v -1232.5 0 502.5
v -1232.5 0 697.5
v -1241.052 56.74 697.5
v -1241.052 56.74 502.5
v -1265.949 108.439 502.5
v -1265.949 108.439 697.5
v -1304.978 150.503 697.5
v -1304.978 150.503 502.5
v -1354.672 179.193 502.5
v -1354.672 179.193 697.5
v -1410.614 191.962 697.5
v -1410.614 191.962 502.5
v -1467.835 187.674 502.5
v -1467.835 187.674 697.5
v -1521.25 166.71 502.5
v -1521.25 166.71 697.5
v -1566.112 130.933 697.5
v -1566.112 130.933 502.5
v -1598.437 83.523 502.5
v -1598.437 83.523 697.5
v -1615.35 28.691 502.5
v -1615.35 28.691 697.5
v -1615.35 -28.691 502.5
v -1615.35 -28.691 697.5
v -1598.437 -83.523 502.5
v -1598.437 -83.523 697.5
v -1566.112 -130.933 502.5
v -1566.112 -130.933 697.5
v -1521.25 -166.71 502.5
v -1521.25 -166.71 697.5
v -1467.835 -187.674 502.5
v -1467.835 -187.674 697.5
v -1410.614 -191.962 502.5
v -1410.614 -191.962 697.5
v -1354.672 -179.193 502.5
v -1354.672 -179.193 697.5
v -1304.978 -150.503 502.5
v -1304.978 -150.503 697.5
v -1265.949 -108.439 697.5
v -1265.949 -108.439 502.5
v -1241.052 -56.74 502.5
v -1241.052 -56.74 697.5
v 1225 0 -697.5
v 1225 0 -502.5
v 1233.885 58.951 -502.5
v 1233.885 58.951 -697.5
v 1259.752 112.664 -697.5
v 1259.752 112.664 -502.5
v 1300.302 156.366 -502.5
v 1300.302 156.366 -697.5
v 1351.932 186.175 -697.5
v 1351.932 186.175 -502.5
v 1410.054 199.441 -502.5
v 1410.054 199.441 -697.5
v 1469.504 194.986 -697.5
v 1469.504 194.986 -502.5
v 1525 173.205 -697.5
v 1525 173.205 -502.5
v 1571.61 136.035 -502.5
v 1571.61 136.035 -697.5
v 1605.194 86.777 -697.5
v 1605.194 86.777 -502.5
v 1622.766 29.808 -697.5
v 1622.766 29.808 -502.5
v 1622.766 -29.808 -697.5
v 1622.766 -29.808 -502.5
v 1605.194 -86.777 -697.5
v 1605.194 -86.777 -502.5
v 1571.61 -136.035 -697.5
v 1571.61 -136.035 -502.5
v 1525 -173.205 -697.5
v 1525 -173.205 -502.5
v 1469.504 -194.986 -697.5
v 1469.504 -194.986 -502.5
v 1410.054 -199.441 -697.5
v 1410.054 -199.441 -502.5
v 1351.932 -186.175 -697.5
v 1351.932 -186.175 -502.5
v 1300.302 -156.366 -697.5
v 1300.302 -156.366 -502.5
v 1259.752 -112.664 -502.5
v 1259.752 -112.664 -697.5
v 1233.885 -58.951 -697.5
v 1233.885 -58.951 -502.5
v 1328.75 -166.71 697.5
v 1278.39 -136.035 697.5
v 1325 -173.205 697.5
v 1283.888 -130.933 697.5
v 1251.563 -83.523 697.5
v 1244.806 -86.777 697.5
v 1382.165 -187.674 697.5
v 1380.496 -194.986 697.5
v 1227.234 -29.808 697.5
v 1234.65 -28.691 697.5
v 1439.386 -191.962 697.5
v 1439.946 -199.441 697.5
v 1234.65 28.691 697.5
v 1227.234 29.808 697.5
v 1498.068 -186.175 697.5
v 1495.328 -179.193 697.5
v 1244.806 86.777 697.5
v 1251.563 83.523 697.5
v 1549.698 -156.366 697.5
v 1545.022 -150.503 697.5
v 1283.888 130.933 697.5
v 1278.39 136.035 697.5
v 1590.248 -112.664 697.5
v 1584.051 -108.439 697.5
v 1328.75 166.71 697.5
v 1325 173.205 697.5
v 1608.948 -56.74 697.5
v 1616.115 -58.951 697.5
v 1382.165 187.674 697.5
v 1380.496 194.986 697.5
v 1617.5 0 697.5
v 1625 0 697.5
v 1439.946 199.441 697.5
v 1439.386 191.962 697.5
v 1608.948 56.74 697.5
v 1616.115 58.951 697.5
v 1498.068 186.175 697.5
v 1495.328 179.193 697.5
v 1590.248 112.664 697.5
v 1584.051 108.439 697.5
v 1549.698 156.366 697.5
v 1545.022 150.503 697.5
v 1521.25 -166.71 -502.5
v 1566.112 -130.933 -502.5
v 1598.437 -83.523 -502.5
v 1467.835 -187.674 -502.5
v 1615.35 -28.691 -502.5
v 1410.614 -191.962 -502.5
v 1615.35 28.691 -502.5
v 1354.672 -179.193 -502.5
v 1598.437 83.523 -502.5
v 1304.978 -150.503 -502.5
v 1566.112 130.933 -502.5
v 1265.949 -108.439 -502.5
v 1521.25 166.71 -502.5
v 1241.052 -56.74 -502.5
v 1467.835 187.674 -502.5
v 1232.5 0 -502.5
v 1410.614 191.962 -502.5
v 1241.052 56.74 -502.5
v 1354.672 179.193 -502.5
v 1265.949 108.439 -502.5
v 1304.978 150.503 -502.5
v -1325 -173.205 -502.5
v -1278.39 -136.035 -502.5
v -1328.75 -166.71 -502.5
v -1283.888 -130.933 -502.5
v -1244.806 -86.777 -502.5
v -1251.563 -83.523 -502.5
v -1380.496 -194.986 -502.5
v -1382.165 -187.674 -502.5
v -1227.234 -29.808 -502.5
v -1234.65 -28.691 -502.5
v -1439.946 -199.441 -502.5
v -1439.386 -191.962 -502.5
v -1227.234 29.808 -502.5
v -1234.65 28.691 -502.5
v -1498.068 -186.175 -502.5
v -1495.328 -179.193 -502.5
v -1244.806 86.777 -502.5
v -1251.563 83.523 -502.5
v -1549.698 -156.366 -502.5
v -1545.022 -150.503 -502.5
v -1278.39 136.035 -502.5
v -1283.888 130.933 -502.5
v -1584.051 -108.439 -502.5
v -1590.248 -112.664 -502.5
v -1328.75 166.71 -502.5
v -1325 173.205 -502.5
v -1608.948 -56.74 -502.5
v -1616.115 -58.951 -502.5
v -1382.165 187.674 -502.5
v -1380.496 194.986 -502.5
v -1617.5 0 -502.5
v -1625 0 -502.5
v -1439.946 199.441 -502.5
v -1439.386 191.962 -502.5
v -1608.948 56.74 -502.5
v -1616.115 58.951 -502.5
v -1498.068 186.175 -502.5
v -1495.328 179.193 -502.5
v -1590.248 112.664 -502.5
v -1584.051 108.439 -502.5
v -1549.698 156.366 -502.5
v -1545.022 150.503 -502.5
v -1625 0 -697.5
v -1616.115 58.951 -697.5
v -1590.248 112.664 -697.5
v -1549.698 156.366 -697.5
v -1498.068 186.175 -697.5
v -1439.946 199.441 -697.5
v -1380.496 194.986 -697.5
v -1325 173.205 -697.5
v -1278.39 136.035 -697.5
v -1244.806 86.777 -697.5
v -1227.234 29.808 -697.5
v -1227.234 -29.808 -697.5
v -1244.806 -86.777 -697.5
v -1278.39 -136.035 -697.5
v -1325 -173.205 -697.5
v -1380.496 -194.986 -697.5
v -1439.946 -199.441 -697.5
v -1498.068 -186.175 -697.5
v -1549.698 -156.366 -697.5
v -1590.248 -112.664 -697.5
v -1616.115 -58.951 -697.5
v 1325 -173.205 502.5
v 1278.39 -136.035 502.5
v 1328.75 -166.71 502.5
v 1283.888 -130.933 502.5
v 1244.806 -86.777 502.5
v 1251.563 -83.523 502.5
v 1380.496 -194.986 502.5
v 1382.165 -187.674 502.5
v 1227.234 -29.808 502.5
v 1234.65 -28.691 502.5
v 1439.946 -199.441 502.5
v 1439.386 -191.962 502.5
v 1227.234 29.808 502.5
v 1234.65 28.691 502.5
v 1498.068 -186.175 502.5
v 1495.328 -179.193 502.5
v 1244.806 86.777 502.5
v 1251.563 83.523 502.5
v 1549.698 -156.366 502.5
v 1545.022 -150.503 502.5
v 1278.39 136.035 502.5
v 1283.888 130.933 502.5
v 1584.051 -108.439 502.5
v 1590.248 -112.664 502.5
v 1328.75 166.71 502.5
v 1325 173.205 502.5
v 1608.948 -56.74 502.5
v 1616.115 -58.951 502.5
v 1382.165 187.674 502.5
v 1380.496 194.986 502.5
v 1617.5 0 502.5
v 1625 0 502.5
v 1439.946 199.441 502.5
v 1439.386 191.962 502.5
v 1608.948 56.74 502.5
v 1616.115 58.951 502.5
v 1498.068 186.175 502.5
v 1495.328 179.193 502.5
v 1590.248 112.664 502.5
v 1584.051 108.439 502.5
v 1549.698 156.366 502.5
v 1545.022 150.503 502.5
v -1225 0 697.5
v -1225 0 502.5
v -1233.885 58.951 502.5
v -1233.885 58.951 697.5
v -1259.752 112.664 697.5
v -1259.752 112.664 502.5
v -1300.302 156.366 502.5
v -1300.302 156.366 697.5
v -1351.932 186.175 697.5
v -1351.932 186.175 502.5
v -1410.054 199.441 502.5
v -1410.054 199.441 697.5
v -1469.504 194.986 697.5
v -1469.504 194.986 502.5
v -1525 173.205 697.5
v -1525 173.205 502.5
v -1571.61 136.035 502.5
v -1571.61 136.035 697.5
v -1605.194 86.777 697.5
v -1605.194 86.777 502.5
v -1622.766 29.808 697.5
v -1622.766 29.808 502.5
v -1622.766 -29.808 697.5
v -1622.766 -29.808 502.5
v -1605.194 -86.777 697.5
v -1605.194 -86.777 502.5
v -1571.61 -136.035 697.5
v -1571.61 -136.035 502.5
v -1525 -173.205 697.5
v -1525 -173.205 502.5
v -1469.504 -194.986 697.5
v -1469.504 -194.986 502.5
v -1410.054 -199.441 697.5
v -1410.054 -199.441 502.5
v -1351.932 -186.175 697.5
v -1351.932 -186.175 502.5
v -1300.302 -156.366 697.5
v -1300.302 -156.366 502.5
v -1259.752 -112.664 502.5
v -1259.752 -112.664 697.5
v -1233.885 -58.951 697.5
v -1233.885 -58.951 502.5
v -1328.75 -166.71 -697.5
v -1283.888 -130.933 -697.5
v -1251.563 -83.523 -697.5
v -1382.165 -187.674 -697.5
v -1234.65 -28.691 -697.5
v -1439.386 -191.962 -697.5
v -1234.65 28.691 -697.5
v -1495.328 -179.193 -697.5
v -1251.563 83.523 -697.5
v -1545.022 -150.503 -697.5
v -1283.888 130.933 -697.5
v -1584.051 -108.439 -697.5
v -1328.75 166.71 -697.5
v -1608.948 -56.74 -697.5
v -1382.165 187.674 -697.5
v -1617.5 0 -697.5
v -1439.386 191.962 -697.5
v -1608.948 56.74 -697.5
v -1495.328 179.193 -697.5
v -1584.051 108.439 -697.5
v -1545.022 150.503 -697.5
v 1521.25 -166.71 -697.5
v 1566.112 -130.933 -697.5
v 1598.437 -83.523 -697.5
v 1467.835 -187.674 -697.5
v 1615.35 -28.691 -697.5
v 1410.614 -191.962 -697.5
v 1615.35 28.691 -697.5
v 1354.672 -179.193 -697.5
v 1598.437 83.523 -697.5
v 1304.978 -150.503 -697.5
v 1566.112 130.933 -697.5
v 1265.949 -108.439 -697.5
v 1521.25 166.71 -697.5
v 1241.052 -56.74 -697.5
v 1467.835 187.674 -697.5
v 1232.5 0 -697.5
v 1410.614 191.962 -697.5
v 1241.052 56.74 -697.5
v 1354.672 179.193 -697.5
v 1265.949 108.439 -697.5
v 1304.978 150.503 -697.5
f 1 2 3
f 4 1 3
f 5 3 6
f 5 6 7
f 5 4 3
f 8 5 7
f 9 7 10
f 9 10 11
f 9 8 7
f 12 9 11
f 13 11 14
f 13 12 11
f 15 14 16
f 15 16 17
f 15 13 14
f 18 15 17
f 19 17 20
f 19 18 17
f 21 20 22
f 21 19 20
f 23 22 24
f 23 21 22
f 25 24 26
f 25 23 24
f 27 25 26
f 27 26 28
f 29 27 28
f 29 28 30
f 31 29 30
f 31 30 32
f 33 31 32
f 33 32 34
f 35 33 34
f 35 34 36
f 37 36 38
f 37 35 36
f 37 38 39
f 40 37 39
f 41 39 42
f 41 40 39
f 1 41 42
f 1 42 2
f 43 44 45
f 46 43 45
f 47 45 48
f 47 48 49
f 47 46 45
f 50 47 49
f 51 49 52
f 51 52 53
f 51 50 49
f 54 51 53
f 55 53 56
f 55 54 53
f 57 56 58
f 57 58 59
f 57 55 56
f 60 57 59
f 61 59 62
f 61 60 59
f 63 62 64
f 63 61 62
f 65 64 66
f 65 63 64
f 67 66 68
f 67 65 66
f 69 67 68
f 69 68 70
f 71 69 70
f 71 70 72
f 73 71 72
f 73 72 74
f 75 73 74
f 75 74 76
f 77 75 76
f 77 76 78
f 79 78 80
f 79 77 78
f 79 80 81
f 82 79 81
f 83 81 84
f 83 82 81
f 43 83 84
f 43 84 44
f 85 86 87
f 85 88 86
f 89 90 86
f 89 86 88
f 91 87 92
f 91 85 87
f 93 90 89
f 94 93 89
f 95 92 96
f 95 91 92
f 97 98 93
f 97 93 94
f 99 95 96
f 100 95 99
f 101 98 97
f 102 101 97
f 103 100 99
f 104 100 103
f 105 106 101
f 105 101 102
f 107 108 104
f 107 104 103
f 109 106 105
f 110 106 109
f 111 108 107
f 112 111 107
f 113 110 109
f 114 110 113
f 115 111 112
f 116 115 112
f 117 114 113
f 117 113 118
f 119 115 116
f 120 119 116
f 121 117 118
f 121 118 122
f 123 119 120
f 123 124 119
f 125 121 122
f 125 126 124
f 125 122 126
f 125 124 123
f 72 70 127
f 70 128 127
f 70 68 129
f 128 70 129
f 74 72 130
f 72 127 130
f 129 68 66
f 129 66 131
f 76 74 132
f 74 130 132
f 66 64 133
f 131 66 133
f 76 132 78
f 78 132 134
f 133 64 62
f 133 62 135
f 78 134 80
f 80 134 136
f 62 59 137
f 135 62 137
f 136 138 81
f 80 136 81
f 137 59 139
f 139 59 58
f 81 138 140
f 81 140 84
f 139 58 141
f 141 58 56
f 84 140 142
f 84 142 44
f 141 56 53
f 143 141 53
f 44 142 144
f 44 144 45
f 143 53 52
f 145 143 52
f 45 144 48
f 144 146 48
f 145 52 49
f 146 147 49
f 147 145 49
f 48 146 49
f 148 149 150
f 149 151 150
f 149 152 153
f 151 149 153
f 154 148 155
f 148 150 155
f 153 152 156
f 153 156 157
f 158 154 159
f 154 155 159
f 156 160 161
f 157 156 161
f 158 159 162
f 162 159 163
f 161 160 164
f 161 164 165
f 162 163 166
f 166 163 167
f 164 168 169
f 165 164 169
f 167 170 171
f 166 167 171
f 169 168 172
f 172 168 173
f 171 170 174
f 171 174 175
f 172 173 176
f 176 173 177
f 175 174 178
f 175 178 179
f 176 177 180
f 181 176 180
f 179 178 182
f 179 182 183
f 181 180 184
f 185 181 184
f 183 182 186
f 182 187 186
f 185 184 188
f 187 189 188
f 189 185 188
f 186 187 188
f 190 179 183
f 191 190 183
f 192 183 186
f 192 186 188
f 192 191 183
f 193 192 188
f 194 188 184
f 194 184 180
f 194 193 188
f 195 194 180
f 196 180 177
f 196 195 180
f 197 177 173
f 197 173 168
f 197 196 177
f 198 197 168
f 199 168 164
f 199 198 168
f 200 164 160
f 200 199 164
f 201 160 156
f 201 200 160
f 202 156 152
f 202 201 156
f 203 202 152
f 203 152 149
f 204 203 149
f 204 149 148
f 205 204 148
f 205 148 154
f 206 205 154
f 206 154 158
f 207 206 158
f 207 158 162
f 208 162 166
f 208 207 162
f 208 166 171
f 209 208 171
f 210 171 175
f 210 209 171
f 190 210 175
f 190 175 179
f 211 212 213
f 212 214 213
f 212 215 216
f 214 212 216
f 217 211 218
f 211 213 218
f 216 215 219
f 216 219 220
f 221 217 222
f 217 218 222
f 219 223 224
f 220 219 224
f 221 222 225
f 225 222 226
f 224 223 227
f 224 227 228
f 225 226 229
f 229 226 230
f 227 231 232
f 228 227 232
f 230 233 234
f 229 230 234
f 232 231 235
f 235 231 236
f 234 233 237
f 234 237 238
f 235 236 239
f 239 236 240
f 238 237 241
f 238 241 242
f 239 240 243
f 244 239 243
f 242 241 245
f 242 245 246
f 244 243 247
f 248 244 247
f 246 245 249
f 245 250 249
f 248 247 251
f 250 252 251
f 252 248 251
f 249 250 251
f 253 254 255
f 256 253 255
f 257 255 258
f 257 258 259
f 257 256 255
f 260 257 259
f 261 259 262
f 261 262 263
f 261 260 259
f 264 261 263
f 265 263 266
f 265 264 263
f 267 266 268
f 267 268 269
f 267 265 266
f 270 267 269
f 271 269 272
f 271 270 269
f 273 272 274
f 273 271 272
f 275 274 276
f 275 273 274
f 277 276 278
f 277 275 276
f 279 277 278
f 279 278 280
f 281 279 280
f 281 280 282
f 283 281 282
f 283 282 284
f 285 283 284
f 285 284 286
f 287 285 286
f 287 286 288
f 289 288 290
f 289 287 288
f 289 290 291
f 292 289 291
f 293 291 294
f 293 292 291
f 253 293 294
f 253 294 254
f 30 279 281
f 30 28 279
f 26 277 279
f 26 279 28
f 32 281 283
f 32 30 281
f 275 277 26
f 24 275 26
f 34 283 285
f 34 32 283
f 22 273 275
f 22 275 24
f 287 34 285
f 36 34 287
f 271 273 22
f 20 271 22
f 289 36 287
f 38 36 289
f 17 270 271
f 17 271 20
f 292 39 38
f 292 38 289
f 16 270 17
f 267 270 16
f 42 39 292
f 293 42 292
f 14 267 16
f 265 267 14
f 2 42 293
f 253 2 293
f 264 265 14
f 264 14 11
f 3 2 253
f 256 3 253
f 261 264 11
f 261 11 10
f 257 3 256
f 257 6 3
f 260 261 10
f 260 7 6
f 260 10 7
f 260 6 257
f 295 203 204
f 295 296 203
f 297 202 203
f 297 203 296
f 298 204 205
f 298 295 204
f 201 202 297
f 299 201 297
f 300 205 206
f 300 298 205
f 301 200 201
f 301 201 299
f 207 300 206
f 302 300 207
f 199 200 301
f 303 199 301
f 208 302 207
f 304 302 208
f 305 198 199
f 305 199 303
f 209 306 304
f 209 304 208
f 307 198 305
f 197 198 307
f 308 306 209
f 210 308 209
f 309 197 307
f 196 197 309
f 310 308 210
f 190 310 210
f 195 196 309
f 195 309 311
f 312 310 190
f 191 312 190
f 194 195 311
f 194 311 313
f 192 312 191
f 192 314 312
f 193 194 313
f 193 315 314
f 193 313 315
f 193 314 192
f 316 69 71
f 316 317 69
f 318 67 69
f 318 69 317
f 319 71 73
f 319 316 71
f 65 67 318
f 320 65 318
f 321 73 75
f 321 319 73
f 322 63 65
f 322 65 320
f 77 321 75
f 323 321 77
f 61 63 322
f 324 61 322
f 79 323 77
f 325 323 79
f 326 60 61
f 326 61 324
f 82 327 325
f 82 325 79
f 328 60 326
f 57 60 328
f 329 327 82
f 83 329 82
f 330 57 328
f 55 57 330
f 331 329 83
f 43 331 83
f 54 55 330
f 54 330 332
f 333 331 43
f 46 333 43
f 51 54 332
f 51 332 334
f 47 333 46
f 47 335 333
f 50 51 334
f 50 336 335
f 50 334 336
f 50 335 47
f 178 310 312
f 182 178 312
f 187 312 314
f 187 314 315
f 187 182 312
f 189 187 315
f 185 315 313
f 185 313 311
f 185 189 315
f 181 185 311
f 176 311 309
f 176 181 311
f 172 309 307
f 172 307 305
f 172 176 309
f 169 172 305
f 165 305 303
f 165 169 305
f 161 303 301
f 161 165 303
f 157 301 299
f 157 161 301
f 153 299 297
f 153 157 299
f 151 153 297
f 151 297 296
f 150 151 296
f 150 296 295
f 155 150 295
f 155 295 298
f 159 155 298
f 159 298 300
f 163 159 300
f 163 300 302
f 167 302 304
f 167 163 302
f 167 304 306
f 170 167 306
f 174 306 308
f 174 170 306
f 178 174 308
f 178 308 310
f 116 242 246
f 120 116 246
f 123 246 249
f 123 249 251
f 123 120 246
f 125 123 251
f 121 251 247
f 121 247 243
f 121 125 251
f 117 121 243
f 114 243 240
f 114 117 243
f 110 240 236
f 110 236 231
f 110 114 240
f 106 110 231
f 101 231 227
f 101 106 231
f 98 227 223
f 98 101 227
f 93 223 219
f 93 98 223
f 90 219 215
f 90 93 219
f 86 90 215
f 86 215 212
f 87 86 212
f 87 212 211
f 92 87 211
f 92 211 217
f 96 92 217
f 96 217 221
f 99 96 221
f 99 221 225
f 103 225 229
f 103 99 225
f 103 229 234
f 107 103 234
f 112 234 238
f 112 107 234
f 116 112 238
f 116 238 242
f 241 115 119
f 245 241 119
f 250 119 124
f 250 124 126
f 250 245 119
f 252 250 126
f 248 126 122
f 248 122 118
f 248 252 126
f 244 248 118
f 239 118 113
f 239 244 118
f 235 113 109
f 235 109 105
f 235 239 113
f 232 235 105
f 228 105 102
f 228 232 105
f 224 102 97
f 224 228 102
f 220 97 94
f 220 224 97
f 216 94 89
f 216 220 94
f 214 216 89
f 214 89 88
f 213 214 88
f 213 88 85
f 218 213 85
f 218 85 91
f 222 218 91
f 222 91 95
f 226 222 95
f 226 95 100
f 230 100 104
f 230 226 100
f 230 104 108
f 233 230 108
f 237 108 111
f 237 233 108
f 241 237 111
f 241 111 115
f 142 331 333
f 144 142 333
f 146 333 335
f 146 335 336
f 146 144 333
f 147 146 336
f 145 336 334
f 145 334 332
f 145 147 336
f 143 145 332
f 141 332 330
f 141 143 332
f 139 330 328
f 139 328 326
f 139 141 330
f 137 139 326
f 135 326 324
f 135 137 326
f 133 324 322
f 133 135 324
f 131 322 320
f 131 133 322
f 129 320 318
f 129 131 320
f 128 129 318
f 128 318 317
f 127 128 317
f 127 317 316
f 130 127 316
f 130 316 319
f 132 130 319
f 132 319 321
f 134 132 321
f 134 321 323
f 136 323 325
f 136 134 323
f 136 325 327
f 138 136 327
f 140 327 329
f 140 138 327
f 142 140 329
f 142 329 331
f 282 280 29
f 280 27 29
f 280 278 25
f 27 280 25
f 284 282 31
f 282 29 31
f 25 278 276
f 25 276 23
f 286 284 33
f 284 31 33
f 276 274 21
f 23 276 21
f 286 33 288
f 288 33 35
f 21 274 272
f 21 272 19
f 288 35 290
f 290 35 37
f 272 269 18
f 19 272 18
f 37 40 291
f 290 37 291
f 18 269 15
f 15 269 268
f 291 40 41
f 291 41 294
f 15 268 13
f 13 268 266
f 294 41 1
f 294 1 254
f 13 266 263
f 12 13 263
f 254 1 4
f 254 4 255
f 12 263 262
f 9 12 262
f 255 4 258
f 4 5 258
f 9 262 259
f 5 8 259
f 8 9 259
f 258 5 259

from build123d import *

# Parameters (mm, degrees)
SKETCH3_R             = 200
SKETCH3_R_2           = 192.5
BOSS_EXTRUDE1_DEPTH   = 97.5
BOSS_EXTRUDE1_2_DEPTH = 97.5
SKETCH5_R             = 200
SKETCH5_R_2           = 192.5
BOSS_EXTRUDE2_DEPTH   = 97.5
BOSS_EXTRUDE2_2_DEPTH = 97.5


with BuildPart() as part:
    # Sketch3 → Boss-Extrude1 (new body, symmetric)
    with BuildSketch(Plane.XY.offset(600)):
        with Locations((-1425, 0)):
            Circle(SKETCH3_R)
        with Locations((-1425, 0)):
            Circle(SKETCH3_R_2, mode=Mode.SUBTRACT)
    extrude(amount=BOSS_EXTRUDE1_DEPTH, both=True)


with BuildPart() as body_2:
    # Sketch3 → Boss-Extrude1 2 (new body, symmetric)
    with BuildSketch(Plane.XY.offset(600)):
        with Locations((1425, 0)):
            Circle(SKETCH3_R)
        with Locations((1425, 0)):
            Circle(SKETCH3_R_2, mode=Mode.SUBTRACT)
    extrude(amount=BOSS_EXTRUDE1_2_DEPTH, both=True)


with BuildPart() as body_3:
    # Sketch5 → Boss-Extrude2 (new body, symmetric)
    with BuildSketch(Plane(origin=(0, 0, -600), x_dir=(-1, 0, 0), z_dir=(0, 0, -1))):
        with Locations((-1425, 0)):
            Circle(SKETCH5_R)
        with Locations((-1425, 0)):
            Circle(SKETCH5_R_2, mode=Mode.SUBTRACT)
    extrude(amount=BOSS_EXTRUDE2_DEPTH, both=True)


with BuildPart() as body_4:
    # Sketch5 → Boss-Extrude2 2 (new body, symmetric)
    with BuildSketch(Plane(origin=(0, 0, -600), x_dir=(-1, 0, 0), z_dir=(0, 0, -1))):
        with Locations((1425, 0)):
            Circle(SKETCH5_R)
        with Locations((1425, 0)):
            Circle(SKETCH5_R_2, mode=Mode.SUBTRACT)
    extrude(amount=BOSS_EXTRUDE2_2_DEPTH, both=True)


solid = Compound([part.part, body_2.part, body_3.part, body_4.part])
